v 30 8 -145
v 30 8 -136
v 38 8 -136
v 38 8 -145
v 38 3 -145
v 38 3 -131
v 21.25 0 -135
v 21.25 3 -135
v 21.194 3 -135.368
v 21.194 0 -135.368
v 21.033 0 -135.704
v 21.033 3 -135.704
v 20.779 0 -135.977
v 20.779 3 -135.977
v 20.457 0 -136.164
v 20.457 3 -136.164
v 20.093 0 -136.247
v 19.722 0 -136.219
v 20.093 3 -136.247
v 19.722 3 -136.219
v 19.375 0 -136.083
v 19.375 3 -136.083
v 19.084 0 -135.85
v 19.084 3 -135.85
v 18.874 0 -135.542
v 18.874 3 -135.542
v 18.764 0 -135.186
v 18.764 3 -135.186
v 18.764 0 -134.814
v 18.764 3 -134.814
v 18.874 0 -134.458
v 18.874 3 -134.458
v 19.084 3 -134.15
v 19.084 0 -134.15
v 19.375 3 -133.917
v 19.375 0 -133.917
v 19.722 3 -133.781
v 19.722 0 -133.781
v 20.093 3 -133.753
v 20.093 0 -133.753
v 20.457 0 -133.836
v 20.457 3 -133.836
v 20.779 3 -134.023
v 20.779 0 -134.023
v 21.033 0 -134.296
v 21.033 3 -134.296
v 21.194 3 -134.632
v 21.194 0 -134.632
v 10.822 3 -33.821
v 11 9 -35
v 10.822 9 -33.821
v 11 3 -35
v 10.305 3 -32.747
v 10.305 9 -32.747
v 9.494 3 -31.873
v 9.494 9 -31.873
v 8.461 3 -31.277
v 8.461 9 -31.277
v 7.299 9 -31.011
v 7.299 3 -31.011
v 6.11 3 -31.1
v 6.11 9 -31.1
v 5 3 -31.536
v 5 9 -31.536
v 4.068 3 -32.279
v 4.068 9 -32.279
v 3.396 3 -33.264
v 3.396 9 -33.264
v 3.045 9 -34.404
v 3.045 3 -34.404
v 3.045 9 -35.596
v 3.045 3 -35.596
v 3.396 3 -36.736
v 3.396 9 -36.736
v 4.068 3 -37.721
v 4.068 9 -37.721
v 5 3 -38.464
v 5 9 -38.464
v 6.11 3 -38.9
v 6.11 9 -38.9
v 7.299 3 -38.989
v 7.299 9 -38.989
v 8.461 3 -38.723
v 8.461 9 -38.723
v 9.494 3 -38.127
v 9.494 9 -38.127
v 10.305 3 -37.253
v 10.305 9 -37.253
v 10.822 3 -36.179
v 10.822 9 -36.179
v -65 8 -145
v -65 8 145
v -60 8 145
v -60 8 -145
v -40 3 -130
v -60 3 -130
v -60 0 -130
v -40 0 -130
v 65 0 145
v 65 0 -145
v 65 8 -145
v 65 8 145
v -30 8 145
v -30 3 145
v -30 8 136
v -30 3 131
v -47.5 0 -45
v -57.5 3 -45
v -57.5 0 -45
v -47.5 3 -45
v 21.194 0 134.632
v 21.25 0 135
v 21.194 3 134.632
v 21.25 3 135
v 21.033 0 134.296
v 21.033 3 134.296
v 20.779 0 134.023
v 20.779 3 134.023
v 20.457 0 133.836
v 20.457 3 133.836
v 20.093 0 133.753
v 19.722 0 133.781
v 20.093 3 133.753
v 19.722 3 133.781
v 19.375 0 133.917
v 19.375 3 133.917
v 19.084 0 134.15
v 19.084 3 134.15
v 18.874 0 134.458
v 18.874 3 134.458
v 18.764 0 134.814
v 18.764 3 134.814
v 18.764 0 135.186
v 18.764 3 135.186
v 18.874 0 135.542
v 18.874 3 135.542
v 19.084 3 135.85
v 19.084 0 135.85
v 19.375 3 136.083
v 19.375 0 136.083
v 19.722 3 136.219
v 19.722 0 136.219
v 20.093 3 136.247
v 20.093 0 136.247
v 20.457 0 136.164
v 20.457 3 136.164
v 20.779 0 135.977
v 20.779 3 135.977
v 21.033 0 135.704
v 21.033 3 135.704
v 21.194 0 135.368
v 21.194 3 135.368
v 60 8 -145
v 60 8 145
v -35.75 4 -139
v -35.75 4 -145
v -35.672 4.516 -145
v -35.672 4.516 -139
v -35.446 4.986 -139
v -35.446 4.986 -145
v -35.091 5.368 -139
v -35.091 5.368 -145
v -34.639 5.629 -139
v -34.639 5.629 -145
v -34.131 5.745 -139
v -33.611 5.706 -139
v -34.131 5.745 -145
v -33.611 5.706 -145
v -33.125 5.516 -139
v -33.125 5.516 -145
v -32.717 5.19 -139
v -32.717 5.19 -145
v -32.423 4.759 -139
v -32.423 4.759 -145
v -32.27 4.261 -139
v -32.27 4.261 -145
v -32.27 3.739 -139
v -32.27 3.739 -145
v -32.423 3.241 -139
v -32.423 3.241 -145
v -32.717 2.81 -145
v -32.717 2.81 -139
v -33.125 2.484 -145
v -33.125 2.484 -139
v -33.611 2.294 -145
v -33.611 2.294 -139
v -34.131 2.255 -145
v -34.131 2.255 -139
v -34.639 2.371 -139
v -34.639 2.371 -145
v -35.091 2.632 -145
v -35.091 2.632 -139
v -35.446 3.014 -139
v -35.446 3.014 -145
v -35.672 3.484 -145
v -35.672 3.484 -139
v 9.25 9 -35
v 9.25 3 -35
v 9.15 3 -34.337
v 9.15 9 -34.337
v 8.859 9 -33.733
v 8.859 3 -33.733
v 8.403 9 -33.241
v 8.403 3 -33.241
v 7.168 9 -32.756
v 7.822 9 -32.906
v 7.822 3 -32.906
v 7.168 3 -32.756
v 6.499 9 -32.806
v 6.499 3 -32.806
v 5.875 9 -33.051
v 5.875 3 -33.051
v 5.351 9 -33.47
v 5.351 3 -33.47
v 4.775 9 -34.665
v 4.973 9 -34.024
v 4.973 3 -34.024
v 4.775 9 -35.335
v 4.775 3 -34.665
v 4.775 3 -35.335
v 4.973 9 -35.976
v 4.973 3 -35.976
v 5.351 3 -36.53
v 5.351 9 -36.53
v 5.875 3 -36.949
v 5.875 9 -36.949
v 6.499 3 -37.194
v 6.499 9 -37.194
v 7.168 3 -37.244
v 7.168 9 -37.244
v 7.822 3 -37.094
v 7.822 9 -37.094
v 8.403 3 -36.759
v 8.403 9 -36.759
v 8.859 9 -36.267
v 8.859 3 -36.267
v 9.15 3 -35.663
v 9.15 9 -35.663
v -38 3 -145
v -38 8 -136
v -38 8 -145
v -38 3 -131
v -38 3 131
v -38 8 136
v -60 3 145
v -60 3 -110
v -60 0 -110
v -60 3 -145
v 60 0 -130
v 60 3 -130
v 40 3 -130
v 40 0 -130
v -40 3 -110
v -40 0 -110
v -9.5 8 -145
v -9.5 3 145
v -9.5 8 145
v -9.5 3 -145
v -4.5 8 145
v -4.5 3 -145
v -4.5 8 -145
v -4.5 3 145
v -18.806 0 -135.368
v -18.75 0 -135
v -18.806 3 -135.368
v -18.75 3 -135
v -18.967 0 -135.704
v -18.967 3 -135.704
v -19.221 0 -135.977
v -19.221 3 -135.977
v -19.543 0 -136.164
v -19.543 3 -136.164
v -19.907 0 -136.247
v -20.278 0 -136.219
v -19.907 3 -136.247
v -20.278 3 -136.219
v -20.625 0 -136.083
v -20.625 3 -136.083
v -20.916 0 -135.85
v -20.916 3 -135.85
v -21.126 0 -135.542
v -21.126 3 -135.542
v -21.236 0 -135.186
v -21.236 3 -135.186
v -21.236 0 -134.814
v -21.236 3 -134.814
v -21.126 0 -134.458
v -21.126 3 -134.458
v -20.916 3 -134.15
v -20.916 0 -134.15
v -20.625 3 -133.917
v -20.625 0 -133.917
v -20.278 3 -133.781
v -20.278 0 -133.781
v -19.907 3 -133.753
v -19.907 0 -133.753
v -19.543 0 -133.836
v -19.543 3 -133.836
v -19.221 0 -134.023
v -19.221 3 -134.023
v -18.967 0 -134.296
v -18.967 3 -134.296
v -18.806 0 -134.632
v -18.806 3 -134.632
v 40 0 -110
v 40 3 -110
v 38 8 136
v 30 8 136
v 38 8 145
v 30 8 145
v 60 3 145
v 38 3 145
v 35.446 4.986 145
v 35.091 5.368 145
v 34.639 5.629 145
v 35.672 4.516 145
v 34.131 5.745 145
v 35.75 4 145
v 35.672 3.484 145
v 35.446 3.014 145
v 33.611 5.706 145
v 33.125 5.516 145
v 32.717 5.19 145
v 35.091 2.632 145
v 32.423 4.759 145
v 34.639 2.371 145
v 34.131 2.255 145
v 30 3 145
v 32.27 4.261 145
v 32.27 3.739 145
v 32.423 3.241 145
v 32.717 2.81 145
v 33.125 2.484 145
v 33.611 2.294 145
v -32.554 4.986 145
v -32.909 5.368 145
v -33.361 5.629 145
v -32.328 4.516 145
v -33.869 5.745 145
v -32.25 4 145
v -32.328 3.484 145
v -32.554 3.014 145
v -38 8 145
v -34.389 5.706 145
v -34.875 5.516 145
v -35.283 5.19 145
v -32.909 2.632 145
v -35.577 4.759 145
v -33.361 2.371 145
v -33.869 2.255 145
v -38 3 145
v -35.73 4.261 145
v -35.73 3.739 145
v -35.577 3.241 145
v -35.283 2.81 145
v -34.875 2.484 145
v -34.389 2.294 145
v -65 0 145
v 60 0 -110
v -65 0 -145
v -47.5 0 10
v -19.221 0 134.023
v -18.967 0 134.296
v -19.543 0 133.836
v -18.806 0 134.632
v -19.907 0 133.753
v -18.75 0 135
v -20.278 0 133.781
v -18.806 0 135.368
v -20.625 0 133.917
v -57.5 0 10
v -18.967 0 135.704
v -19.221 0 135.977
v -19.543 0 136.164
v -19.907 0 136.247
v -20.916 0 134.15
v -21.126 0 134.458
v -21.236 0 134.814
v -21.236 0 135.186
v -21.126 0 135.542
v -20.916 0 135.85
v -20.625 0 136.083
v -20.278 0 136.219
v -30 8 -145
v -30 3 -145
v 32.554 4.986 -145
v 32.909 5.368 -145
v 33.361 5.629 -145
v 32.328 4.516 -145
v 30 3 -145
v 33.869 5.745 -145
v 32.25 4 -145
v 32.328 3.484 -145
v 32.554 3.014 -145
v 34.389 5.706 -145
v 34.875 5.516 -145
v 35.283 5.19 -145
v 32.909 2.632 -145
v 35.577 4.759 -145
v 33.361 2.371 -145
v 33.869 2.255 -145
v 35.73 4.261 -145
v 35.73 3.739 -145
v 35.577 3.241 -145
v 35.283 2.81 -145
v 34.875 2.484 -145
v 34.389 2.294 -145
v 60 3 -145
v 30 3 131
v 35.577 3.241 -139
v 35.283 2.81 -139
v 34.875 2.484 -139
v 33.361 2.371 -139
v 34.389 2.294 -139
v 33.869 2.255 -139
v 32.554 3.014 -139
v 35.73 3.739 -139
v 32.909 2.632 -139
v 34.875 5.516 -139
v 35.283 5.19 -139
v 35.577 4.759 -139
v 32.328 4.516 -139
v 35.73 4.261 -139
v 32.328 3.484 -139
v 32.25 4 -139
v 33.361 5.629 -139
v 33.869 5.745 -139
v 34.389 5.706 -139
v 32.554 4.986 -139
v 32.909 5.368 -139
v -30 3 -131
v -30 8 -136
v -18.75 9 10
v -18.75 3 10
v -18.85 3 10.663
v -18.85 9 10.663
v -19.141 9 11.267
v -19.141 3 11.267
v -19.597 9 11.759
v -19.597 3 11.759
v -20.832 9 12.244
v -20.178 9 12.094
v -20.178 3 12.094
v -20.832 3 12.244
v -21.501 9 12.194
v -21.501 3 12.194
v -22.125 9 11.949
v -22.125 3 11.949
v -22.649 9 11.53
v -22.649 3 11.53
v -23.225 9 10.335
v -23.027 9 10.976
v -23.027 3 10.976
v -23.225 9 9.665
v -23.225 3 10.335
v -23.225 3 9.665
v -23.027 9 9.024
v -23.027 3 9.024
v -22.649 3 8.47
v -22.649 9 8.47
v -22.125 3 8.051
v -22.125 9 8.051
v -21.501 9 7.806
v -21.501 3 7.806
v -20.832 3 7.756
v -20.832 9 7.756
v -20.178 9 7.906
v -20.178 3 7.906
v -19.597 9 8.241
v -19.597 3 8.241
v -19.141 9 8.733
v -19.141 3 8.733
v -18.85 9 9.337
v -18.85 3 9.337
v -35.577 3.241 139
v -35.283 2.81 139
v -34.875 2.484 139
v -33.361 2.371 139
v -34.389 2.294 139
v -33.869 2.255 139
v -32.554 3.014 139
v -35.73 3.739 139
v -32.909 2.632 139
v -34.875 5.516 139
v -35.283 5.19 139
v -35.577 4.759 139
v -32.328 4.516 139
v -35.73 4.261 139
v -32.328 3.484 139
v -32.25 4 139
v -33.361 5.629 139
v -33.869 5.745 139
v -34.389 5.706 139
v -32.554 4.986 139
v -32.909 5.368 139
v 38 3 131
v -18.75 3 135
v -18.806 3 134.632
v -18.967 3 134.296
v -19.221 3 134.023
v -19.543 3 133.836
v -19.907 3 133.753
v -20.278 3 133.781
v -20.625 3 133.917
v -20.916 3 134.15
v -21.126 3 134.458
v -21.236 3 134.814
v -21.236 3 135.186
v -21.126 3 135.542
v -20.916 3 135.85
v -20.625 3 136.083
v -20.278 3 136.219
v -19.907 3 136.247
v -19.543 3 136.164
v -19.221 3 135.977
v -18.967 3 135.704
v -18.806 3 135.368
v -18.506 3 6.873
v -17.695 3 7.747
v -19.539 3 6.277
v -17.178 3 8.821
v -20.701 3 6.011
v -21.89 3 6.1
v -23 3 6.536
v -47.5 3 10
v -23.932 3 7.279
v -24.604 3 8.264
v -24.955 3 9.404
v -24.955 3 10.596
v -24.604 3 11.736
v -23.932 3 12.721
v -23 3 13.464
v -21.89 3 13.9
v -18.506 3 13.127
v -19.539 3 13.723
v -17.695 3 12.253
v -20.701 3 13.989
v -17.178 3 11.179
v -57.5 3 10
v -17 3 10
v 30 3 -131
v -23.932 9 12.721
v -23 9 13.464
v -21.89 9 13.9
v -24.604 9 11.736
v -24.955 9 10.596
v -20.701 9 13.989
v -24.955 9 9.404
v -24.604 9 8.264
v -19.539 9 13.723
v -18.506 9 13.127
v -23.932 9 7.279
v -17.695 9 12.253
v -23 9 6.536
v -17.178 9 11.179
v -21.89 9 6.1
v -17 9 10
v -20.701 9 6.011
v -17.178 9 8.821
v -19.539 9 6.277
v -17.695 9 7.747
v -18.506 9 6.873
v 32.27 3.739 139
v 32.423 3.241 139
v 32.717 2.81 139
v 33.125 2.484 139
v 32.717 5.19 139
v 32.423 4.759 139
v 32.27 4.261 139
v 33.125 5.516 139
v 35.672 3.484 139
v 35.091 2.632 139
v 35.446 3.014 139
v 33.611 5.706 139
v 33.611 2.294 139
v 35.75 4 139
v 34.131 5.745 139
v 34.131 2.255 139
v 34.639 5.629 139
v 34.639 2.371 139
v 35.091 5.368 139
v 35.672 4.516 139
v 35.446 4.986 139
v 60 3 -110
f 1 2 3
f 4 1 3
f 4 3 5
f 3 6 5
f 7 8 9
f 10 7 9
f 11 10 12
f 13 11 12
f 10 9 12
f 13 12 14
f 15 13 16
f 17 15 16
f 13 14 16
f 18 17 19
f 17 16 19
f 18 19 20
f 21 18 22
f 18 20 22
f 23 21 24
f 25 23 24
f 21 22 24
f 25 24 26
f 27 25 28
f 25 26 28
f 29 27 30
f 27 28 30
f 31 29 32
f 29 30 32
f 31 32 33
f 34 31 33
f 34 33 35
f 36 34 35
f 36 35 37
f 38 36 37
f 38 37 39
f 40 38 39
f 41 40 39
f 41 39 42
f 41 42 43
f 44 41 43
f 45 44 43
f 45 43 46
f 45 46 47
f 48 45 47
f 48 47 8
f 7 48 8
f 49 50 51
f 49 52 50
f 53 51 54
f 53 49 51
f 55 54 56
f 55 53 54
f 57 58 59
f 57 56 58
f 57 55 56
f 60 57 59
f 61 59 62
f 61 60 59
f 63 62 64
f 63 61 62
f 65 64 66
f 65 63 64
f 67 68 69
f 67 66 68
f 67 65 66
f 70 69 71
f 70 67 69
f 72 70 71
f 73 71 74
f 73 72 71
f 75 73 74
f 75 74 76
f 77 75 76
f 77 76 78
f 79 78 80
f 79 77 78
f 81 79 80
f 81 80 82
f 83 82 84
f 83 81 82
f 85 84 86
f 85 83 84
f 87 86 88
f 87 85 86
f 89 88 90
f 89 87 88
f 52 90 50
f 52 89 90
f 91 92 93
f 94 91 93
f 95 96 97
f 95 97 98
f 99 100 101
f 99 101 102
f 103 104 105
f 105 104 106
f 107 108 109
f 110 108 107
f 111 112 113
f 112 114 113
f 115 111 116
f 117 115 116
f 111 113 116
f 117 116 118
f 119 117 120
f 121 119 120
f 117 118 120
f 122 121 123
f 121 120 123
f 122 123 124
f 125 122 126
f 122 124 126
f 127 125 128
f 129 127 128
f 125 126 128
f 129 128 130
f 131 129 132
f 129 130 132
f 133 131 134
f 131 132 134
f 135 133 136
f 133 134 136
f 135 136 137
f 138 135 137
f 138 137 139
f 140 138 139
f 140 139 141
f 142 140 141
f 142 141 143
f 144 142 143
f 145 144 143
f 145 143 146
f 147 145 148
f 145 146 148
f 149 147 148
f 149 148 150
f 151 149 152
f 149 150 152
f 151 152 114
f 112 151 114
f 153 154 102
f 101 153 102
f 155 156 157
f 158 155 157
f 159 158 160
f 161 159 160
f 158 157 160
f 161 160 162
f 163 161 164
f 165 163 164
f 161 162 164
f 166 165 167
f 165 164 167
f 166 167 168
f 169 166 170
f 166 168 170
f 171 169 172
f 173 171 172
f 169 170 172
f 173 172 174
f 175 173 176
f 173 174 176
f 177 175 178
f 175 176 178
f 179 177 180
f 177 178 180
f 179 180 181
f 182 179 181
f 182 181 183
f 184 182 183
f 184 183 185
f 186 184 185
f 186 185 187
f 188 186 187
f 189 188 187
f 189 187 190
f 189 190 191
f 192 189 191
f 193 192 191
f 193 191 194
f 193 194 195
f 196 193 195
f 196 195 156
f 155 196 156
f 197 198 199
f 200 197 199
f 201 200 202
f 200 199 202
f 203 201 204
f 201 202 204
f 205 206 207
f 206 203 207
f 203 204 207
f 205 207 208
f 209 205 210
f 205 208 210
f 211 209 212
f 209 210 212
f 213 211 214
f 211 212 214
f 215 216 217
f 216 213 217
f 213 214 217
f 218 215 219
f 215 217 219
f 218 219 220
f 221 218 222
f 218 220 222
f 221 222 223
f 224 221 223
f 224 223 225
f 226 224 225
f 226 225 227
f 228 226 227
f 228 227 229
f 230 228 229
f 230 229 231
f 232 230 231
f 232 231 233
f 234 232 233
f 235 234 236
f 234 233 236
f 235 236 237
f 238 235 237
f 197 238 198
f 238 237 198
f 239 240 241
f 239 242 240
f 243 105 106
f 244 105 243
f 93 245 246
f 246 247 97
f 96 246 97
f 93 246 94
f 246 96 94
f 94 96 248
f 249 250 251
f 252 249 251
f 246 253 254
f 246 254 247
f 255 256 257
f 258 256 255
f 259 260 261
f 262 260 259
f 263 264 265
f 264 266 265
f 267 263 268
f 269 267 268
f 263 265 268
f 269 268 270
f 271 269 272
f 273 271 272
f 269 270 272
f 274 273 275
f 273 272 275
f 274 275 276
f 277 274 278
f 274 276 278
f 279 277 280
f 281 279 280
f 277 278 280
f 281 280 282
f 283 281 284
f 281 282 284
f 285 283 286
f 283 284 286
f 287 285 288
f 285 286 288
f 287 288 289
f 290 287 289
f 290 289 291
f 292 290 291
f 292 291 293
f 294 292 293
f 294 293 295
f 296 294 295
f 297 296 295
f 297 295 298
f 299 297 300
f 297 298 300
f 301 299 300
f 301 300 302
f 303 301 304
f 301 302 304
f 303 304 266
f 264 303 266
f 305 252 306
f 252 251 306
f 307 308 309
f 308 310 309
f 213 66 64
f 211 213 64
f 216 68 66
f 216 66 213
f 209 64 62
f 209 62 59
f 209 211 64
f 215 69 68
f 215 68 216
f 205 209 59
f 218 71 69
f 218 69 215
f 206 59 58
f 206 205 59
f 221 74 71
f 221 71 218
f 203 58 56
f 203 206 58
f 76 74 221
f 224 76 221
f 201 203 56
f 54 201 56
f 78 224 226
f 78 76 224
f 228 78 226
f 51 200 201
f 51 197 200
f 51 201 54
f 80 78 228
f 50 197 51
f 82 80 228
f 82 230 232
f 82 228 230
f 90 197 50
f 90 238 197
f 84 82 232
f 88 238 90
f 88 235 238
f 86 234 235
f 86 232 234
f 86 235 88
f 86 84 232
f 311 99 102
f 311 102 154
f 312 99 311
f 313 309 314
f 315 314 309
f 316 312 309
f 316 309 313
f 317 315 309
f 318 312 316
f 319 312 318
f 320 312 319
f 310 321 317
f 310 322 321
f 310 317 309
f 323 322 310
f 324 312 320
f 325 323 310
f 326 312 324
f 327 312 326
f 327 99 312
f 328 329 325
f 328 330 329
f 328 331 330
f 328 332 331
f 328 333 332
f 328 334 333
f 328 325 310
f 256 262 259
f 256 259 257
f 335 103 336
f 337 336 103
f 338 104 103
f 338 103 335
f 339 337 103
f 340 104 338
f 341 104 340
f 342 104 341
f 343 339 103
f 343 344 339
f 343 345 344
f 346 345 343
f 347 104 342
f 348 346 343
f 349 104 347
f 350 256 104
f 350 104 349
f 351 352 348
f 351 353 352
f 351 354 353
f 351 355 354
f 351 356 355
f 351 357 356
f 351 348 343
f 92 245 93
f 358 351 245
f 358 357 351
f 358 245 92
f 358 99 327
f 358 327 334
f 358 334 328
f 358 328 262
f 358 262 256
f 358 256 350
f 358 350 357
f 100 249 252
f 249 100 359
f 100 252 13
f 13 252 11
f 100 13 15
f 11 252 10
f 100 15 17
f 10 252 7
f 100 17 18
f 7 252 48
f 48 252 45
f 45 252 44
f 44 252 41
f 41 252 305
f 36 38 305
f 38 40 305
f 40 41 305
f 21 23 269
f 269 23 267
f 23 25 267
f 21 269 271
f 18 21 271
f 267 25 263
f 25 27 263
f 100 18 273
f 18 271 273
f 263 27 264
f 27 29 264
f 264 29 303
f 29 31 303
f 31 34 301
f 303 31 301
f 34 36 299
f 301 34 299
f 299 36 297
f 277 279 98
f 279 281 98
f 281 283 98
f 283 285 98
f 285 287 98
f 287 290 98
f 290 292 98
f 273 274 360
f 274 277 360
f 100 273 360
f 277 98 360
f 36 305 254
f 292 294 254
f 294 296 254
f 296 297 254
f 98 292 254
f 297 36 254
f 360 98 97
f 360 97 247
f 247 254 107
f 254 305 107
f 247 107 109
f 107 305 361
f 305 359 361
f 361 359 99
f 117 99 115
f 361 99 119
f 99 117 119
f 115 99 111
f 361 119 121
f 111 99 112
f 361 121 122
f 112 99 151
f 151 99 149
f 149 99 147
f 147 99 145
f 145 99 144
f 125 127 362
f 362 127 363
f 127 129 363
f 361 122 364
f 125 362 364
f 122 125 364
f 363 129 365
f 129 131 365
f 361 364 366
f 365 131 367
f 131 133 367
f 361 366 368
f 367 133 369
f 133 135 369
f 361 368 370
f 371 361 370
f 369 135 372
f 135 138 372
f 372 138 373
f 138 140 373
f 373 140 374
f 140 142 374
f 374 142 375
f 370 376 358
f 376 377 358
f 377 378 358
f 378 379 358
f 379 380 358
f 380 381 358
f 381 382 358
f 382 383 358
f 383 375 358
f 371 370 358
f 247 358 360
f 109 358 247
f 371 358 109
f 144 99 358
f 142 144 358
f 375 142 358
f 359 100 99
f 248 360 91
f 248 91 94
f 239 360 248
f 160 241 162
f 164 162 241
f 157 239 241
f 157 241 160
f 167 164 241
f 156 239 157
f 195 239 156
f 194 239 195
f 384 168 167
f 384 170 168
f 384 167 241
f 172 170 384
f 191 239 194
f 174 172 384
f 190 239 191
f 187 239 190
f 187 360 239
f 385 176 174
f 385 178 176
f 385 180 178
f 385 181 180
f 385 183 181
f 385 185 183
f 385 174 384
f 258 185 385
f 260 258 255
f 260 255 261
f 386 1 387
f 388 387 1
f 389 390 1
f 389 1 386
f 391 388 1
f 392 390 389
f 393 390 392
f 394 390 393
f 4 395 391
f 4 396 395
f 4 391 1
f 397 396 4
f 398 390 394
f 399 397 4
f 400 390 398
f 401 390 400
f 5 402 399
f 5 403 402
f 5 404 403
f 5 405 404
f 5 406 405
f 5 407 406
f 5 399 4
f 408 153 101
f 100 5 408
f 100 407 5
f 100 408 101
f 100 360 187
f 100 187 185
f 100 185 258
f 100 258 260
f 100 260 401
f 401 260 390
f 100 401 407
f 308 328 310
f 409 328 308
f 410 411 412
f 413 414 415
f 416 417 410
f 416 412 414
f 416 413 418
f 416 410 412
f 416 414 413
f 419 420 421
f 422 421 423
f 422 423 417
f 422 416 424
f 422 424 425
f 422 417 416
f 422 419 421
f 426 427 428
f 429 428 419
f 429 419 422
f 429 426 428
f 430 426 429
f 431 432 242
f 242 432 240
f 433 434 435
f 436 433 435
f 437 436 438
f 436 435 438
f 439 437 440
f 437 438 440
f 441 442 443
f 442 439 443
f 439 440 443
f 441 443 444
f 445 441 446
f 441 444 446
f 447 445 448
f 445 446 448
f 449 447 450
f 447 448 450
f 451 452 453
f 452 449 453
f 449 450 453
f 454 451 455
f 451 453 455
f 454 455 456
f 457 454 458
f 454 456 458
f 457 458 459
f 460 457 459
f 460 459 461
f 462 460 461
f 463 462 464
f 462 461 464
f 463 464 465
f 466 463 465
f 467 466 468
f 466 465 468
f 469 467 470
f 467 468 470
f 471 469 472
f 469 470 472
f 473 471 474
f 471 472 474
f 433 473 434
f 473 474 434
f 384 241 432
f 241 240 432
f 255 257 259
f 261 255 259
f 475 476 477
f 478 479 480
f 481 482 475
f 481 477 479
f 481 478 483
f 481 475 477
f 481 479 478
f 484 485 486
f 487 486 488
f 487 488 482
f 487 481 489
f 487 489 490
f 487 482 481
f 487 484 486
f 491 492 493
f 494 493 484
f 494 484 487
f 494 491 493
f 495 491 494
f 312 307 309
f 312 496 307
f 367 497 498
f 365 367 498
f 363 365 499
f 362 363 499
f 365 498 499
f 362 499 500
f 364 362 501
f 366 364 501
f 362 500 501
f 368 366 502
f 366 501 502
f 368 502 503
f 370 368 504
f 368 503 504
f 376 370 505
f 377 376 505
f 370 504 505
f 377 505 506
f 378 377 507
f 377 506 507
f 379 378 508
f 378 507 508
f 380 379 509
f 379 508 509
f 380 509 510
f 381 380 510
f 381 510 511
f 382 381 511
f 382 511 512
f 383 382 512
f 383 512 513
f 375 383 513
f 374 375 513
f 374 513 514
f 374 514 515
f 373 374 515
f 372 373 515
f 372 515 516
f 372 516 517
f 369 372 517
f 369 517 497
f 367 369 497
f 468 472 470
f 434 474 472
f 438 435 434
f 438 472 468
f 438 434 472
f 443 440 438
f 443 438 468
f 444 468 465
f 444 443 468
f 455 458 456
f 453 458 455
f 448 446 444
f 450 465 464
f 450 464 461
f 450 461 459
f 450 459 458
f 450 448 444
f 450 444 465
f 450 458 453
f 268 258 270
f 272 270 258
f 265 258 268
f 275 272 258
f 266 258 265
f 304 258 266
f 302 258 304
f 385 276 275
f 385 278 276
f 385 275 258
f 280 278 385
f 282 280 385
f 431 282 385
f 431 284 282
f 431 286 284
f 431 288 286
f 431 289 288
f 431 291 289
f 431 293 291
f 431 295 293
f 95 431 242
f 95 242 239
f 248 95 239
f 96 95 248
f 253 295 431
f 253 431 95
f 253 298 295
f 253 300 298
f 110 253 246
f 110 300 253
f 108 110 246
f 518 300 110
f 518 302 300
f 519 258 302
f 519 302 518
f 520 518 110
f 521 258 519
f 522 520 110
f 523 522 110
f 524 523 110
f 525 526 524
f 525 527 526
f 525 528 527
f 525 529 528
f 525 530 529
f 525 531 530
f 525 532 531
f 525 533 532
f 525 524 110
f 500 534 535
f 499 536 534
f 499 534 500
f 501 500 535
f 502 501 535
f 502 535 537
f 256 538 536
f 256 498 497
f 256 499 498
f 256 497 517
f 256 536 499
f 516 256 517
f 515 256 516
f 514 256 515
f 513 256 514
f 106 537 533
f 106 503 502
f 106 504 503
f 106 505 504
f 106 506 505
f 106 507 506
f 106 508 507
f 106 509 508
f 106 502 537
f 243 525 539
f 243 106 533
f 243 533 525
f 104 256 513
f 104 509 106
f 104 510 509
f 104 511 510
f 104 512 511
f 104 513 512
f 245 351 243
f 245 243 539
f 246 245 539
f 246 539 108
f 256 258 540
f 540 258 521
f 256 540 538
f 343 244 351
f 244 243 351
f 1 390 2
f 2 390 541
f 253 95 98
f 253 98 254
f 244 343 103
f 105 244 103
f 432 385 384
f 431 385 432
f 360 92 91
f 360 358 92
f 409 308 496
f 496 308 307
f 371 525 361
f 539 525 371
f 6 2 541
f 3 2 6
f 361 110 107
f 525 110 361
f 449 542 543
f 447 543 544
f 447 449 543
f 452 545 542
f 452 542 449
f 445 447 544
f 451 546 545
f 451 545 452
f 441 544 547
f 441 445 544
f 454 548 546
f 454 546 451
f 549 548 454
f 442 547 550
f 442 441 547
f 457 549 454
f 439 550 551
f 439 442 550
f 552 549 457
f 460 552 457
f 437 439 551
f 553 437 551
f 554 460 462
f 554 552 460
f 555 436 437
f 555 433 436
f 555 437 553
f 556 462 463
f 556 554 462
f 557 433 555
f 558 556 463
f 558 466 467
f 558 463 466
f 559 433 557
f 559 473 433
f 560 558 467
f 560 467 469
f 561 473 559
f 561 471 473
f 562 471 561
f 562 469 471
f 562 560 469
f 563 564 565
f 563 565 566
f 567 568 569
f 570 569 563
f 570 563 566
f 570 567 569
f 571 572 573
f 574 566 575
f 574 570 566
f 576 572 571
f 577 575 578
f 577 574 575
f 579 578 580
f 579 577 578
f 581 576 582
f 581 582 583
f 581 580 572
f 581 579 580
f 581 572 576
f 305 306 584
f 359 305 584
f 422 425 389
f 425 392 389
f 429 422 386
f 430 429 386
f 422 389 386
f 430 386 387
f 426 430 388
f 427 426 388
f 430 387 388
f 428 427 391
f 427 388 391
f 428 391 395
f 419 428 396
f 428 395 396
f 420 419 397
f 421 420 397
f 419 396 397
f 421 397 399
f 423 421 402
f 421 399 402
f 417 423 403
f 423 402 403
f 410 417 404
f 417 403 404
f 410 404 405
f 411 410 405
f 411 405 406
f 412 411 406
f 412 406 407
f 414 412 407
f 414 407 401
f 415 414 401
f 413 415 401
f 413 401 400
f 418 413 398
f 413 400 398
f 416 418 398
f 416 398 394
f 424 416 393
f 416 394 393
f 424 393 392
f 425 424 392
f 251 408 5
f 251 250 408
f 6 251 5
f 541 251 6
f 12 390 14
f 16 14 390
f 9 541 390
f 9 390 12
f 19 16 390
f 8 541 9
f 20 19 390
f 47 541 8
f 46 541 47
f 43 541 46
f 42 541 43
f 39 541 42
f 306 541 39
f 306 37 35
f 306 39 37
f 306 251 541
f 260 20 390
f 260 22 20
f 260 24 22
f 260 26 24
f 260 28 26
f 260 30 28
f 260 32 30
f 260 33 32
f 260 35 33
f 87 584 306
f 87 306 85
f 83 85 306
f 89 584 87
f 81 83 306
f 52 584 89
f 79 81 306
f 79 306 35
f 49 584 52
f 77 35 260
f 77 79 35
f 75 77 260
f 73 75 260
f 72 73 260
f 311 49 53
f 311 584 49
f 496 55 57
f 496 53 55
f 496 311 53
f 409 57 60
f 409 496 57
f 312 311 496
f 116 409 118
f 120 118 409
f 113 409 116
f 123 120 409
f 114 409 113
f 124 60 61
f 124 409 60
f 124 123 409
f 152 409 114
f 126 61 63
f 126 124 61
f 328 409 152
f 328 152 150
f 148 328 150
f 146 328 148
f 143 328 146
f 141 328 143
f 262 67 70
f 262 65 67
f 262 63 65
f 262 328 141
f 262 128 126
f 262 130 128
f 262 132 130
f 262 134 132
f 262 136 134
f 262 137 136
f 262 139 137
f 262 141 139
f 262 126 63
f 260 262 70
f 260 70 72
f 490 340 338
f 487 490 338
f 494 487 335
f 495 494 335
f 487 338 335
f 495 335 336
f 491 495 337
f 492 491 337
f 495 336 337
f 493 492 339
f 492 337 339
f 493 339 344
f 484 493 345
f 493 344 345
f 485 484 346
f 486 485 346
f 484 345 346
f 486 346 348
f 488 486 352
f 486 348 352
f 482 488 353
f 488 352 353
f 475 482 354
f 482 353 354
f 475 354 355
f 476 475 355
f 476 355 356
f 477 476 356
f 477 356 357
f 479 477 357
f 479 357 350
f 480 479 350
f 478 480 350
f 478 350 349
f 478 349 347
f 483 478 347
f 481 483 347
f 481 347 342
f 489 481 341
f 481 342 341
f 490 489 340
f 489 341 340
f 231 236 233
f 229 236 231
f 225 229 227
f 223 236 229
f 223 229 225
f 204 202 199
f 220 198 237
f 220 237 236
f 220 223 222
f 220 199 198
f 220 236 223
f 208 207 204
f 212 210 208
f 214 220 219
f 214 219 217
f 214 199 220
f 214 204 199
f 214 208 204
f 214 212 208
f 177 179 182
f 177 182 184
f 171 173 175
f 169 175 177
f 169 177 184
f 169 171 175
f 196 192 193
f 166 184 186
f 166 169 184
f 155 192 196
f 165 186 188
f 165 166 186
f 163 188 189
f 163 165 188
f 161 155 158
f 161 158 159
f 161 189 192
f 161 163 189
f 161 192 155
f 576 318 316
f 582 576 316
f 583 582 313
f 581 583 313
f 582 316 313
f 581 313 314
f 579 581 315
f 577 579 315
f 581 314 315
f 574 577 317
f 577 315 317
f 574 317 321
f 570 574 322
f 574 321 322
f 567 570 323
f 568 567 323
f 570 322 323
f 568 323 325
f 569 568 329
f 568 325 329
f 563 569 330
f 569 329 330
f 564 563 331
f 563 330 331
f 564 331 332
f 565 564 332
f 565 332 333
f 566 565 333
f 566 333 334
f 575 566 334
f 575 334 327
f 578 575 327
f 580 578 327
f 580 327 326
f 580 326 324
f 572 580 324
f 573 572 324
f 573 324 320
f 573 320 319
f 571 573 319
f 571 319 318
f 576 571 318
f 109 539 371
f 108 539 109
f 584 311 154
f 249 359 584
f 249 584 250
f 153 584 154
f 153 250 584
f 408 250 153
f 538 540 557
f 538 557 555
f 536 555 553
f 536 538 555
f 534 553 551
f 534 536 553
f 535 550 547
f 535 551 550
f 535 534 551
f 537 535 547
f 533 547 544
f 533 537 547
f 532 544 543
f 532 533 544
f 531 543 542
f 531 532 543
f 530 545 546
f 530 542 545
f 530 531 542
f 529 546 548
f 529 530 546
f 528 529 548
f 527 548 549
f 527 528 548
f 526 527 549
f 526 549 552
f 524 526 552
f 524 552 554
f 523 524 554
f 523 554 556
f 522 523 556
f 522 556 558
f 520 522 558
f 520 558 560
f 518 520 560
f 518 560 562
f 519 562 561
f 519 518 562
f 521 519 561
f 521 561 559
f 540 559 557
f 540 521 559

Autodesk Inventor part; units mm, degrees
ref_plane "YZ Plane" through (0, 0, 0) normal (1, 0, 0) x (0, 1, 0)
ref_plane "XZ Plane" through (0, 0, 0) normal (0, 1, 0) x (-1, 0, 0)
ref_plane "XY Plane" through (0, 0, 0) normal (0, 0, 1) x (1, 0, 0)
sketch "Sketch1" plane through (0, 0, 0) normal (0, 1, 0) x (-1, 0, 0)
  line L0 (65, -145) -> (-65, -145)
  line L1 (-65, -145) -> (-65, 145)
  line L2 (-65, 145) -> (65, 145)
  line L3 (65, 145) -> (65, -145)
  line L4 (65, 0) -> (-65, 0) construction
  line L5 (0, -145) -> (0, 145) construction
  point P0 (0, 0)
  point P1 (0, 0)
  dimension "d0" = 130
  dimension "d1" = 290
extrude "Extrusion1" add sketch "Sketch1" along normal blind 3
sketch "Sketch2" plane through (0, 0, 0) normal (0, -1, 0) x (1, 0, 0)
  line L0 (65, -145) -> (-65, -145) construction
  line L1 (0, -145) -> (0, 145) construction
  line L2 (-65, 145) -> (65, 145) construction
  line L3 (65, 145) -> (65, -145) construction
  line L4 (65, 0) -> (-65, 0) construction
  line L5 (-65, -145) -> (-65, 145) construction
  line L6 (-38, -145) -> (-30, -145)
  line L7 (-30, -145) -> (-30, -131)
  line L8 (-30, -131) -> (-38, -131)
  line L9 (-38, -131) -> (-38, -145)
  line L10 (38, -145) -> (30, -145)
  line L11 (30, -145) -> (30, -131)
  line L12 (30, -131) -> (38, -131)
  line L13 (38, -131) -> (38, -145)
  line L14 (-38, 145) -> (-30, 145)
  line L15 (-30, 145) -> (-30, 131)
  line L16 (-30, 131) -> (-38, 131)
  line L17 (-38, 131) -> (-38, 145)
  line L18 (30, 145) -> (30, 131)
  line L19 (38, 131) -> (38, 145)
  line L20 (30, 131) -> (38, 131)
  line L21 (38, 145) -> (30, 145)
  point P0 (0, 0)
  dimension "d4" = 8
  dimension "d5" = 14
  dimension "d6" = 30
extrude "Extrusion2" add sketch "Sketch2" against normal blind 8
chamfer "Chamfer1" distance 5 angle 45 4 edges at (-34, 8, 131) (34, 8, 131) (-34, 8, -131) (34, 8, -131)
sketch "Sketch3" plane through (65, 0, -145) normal (0, 0, -1) x (-1, 0, 0)
  line L0 (65, 0) -> (65, 3) construction
  line L1 (35, 3) -> (95, 3) construction
  circle A0 centre (31, 4) radius 1.75
  line L2 (27, 8) -> (35, 8) projected
  line L3 (35, 3) -> (35, 8) projected
  circle A1 centre (99, 4) radius 1.75
  dimension "d12" = 3.5
  dimension "d13" = 4
  dimension "d14" = 4
extrude "Extrusion3" cut sketch "Sketch3" against normal blind 6
sketch "Sketch4" plane through (-65, 0, 145) normal (0, 0, 1) x (1, 0, 0)
  circle A0 centre (99, 4) radius 1.75 projected
  circle A1 centre (31, 4) radius 1.75 projected
  point P0 (65, 0)
extrude "Extrusion4" cut sketch "Sketch4" against normal blind 6
sketch "Sketch5" plane through (0, 3, 0) normal (0, 1, 0) x (1, 0, 0)
  line L0 (-60, 130) -> (-40, 130)
  line L1 (-40, 130) -> (-40, 110)
  line L2 (-40, 110) -> (-60, 110)
  line L3 (-60, 110) -> (-60, 130)
  line L4 (-38, 145) -> (-65, 145) projected
  line L5 (-65, 145) -> (-65, -145) projected
  line L6 (-65, 145) -> (65, 145) construction
  line L7 (0, 145) -> (0, -145) construction
  line L8 (-30, -145) -> (30, -145) construction
  line L9 (60, 130) -> (40, 130)
  line L10 (40, 130) -> (40, 110)
  line L11 (40, 110) -> (60, 110)
  line L12 (60, 110) -> (60, 130)
  point P0 (0, 0)
  dimension "d19" = 20
  dimension "d20" = 20
  dimension "d21" = 15
  dimension "d22" = 5
extrude "Extrusion5" cut sketch "Sketch5" against normal up to next
sketch "Sketch7" plane through (0, 3, 0) normal (0, 1, 0) x (1, 0, 0)
  line L0 (44, -14) -> (-25, -14) construction
  line L1 (-25, -14) -> (-25, 70) construction
  line L2 (-25, 70) -> (44, 70) construction
  line L3 (44, 70) -> (44, -14) construction
  line L4 (9.5, -14) -> (9.5, 70) construction
  line L5 (44, 28) -> (-25, 28) construction
  line L6 (-65, 145) -> (-65, -145) construction
  circle A0 centre (-21, -10) radius 4
  circle A1 centre (-21, -10) radius 2.25
  circle A2 centre (7, 35) radius 4
  circle A3 centre (7, 35) radius 2.25
  point P0 (0, 0)
  point P1 (40, 110)
  dimension "d39" = 69
  dimension "d40" = 84
  dimension "d41" = 40
  dimension "d42" = 40
  dimension "d43" = 8
  dimension "d44" = 4
  dimension "d45" = 4
  dimension "d46" = 4.5
  dimension "d49" = 8
  dimension "d50" = 49
  dimension "d51" = 32
  dimension "d52" = 4.5
extrude "Extrusion7" add sketch "Sketch7" along normal blind 6
sketch "Sketch8" plane through (0, 3, 0) normal (0, 1, 0) x (1, 0, 0)
  line L0 (-57.5, 45) -> (-47.5, 45)
  line L1 (-47.5, 45) -> (-47.5, -10)
  line L2 (-47.5, -10) -> (-57.5, -10)
  line L3 (-57.5, -10) -> (-57.5, 45)
  line L4 (-38, 145) -> (-65, 145) projected
  line L5 (-65, 145) -> (-65, -145) projected
  point P0 (0, 0)
  dimension "d53" = 10
  dimension "d54" = 100
  dimension "d55" = 55
  dimension "d56" = 7.5
extrude "Extrusion8" cut sketch "Sketch8" against normal blind 6
sketch "Sketch9" plane through (0, 3, 0) normal (0, 1, 0) x (1, 0, 0)
  line L0 (65, -145) -> (-65, -145) construction
  line L1 (0, -145) -> (0, 145) construction
  line L2 (-65, 145) -> (65, 145) construction
  line L3 (65, 145) -> (65, -145) construction
  line L4 (65, 0) -> (-65, 0) construction
  line L5 (-65, -145) -> (-65, 145) construction
  line L6 (30, 145) -> (30, 131) construction
  line L7 (30, 135) -> (-30, 135) construction
  line L8 (-30, 131) -> (-30, 145) construction
  circle A0 centre (20, 135) radius 1.25
  circle A1 centre (-20, 135) radius 1.25
  circle A2 centre (20, -135) radius 1.25
  circle A3 centre (-20, -135) radius 1.25
  point P0 (0, 0)
  point P1 (30, 136)
  point P2 (-30, 136)
  dimension "d60" = 10
  dimension "d61" = 2.5
  dimension "d62" = 40
extrude "Extrusion9" cut sketch "Sketch9" against normal blind 10
sketch "Sketch10" plane through (0, 3, 0) normal (0, 1, 0) x (1, 0, 0)
  line L0 (65, -145) -> (-65, -145) construction
  line L1 (0, -145) -> (0, 145) construction
  line L2 (-65, 145) -> (65, 145) construction
  line L3 (-65, -145) -> (-65, 145) projected
  line L4 (-65, -145) -> (-60, -145)
  line L5 (-60, -145) -> (-60, 145)
  line L6 (-60, 145) -> (-65, 145)
  line L7 (-65, 145) -> (-65, -145)
  line L8 (65, -145) -> (65, 145)
  line L9 (65, -145) -> (60, -145)
  line L10 (60, -145) -> (60, 145)
  line L11 (60, 145) -> (65, 145)
  line L12 (65, 145) -> (65, -145)
  point P0 (0, 0)
  dimension "d65" = 5
extrude "Extrusion10" add sketch "Sketch10" along normal blind 5
sketch "Sketch11" plane through (0, 3, 0) normal (0, 1, 0) x (1, 0, 0)
  line L0 (65, -145) -> (-65, -145) projected
  line L1 (-65, 145) -> (65, 145) projected
  line L2 (-4.5, -145) -> (-9.5, -145)
  line L3 (-9.5, -145) -> (-9.5, 145)
  line L4 (-9.5, 145) -> (-4.5, 145)
  line L5 (-4.5, 145) -> (-4.5, -145)
  circle A0 centre (-21, -10) radius 4 projected
  point P0 (0, 0)
  dimension "d68" = 5
  dimension "d69" = 11.5
extrude "Extrusion11" add sketch "Sketch11" along normal blind 5 contours L0 L3 L1 L5
properties part number "electronics_board_tray"
